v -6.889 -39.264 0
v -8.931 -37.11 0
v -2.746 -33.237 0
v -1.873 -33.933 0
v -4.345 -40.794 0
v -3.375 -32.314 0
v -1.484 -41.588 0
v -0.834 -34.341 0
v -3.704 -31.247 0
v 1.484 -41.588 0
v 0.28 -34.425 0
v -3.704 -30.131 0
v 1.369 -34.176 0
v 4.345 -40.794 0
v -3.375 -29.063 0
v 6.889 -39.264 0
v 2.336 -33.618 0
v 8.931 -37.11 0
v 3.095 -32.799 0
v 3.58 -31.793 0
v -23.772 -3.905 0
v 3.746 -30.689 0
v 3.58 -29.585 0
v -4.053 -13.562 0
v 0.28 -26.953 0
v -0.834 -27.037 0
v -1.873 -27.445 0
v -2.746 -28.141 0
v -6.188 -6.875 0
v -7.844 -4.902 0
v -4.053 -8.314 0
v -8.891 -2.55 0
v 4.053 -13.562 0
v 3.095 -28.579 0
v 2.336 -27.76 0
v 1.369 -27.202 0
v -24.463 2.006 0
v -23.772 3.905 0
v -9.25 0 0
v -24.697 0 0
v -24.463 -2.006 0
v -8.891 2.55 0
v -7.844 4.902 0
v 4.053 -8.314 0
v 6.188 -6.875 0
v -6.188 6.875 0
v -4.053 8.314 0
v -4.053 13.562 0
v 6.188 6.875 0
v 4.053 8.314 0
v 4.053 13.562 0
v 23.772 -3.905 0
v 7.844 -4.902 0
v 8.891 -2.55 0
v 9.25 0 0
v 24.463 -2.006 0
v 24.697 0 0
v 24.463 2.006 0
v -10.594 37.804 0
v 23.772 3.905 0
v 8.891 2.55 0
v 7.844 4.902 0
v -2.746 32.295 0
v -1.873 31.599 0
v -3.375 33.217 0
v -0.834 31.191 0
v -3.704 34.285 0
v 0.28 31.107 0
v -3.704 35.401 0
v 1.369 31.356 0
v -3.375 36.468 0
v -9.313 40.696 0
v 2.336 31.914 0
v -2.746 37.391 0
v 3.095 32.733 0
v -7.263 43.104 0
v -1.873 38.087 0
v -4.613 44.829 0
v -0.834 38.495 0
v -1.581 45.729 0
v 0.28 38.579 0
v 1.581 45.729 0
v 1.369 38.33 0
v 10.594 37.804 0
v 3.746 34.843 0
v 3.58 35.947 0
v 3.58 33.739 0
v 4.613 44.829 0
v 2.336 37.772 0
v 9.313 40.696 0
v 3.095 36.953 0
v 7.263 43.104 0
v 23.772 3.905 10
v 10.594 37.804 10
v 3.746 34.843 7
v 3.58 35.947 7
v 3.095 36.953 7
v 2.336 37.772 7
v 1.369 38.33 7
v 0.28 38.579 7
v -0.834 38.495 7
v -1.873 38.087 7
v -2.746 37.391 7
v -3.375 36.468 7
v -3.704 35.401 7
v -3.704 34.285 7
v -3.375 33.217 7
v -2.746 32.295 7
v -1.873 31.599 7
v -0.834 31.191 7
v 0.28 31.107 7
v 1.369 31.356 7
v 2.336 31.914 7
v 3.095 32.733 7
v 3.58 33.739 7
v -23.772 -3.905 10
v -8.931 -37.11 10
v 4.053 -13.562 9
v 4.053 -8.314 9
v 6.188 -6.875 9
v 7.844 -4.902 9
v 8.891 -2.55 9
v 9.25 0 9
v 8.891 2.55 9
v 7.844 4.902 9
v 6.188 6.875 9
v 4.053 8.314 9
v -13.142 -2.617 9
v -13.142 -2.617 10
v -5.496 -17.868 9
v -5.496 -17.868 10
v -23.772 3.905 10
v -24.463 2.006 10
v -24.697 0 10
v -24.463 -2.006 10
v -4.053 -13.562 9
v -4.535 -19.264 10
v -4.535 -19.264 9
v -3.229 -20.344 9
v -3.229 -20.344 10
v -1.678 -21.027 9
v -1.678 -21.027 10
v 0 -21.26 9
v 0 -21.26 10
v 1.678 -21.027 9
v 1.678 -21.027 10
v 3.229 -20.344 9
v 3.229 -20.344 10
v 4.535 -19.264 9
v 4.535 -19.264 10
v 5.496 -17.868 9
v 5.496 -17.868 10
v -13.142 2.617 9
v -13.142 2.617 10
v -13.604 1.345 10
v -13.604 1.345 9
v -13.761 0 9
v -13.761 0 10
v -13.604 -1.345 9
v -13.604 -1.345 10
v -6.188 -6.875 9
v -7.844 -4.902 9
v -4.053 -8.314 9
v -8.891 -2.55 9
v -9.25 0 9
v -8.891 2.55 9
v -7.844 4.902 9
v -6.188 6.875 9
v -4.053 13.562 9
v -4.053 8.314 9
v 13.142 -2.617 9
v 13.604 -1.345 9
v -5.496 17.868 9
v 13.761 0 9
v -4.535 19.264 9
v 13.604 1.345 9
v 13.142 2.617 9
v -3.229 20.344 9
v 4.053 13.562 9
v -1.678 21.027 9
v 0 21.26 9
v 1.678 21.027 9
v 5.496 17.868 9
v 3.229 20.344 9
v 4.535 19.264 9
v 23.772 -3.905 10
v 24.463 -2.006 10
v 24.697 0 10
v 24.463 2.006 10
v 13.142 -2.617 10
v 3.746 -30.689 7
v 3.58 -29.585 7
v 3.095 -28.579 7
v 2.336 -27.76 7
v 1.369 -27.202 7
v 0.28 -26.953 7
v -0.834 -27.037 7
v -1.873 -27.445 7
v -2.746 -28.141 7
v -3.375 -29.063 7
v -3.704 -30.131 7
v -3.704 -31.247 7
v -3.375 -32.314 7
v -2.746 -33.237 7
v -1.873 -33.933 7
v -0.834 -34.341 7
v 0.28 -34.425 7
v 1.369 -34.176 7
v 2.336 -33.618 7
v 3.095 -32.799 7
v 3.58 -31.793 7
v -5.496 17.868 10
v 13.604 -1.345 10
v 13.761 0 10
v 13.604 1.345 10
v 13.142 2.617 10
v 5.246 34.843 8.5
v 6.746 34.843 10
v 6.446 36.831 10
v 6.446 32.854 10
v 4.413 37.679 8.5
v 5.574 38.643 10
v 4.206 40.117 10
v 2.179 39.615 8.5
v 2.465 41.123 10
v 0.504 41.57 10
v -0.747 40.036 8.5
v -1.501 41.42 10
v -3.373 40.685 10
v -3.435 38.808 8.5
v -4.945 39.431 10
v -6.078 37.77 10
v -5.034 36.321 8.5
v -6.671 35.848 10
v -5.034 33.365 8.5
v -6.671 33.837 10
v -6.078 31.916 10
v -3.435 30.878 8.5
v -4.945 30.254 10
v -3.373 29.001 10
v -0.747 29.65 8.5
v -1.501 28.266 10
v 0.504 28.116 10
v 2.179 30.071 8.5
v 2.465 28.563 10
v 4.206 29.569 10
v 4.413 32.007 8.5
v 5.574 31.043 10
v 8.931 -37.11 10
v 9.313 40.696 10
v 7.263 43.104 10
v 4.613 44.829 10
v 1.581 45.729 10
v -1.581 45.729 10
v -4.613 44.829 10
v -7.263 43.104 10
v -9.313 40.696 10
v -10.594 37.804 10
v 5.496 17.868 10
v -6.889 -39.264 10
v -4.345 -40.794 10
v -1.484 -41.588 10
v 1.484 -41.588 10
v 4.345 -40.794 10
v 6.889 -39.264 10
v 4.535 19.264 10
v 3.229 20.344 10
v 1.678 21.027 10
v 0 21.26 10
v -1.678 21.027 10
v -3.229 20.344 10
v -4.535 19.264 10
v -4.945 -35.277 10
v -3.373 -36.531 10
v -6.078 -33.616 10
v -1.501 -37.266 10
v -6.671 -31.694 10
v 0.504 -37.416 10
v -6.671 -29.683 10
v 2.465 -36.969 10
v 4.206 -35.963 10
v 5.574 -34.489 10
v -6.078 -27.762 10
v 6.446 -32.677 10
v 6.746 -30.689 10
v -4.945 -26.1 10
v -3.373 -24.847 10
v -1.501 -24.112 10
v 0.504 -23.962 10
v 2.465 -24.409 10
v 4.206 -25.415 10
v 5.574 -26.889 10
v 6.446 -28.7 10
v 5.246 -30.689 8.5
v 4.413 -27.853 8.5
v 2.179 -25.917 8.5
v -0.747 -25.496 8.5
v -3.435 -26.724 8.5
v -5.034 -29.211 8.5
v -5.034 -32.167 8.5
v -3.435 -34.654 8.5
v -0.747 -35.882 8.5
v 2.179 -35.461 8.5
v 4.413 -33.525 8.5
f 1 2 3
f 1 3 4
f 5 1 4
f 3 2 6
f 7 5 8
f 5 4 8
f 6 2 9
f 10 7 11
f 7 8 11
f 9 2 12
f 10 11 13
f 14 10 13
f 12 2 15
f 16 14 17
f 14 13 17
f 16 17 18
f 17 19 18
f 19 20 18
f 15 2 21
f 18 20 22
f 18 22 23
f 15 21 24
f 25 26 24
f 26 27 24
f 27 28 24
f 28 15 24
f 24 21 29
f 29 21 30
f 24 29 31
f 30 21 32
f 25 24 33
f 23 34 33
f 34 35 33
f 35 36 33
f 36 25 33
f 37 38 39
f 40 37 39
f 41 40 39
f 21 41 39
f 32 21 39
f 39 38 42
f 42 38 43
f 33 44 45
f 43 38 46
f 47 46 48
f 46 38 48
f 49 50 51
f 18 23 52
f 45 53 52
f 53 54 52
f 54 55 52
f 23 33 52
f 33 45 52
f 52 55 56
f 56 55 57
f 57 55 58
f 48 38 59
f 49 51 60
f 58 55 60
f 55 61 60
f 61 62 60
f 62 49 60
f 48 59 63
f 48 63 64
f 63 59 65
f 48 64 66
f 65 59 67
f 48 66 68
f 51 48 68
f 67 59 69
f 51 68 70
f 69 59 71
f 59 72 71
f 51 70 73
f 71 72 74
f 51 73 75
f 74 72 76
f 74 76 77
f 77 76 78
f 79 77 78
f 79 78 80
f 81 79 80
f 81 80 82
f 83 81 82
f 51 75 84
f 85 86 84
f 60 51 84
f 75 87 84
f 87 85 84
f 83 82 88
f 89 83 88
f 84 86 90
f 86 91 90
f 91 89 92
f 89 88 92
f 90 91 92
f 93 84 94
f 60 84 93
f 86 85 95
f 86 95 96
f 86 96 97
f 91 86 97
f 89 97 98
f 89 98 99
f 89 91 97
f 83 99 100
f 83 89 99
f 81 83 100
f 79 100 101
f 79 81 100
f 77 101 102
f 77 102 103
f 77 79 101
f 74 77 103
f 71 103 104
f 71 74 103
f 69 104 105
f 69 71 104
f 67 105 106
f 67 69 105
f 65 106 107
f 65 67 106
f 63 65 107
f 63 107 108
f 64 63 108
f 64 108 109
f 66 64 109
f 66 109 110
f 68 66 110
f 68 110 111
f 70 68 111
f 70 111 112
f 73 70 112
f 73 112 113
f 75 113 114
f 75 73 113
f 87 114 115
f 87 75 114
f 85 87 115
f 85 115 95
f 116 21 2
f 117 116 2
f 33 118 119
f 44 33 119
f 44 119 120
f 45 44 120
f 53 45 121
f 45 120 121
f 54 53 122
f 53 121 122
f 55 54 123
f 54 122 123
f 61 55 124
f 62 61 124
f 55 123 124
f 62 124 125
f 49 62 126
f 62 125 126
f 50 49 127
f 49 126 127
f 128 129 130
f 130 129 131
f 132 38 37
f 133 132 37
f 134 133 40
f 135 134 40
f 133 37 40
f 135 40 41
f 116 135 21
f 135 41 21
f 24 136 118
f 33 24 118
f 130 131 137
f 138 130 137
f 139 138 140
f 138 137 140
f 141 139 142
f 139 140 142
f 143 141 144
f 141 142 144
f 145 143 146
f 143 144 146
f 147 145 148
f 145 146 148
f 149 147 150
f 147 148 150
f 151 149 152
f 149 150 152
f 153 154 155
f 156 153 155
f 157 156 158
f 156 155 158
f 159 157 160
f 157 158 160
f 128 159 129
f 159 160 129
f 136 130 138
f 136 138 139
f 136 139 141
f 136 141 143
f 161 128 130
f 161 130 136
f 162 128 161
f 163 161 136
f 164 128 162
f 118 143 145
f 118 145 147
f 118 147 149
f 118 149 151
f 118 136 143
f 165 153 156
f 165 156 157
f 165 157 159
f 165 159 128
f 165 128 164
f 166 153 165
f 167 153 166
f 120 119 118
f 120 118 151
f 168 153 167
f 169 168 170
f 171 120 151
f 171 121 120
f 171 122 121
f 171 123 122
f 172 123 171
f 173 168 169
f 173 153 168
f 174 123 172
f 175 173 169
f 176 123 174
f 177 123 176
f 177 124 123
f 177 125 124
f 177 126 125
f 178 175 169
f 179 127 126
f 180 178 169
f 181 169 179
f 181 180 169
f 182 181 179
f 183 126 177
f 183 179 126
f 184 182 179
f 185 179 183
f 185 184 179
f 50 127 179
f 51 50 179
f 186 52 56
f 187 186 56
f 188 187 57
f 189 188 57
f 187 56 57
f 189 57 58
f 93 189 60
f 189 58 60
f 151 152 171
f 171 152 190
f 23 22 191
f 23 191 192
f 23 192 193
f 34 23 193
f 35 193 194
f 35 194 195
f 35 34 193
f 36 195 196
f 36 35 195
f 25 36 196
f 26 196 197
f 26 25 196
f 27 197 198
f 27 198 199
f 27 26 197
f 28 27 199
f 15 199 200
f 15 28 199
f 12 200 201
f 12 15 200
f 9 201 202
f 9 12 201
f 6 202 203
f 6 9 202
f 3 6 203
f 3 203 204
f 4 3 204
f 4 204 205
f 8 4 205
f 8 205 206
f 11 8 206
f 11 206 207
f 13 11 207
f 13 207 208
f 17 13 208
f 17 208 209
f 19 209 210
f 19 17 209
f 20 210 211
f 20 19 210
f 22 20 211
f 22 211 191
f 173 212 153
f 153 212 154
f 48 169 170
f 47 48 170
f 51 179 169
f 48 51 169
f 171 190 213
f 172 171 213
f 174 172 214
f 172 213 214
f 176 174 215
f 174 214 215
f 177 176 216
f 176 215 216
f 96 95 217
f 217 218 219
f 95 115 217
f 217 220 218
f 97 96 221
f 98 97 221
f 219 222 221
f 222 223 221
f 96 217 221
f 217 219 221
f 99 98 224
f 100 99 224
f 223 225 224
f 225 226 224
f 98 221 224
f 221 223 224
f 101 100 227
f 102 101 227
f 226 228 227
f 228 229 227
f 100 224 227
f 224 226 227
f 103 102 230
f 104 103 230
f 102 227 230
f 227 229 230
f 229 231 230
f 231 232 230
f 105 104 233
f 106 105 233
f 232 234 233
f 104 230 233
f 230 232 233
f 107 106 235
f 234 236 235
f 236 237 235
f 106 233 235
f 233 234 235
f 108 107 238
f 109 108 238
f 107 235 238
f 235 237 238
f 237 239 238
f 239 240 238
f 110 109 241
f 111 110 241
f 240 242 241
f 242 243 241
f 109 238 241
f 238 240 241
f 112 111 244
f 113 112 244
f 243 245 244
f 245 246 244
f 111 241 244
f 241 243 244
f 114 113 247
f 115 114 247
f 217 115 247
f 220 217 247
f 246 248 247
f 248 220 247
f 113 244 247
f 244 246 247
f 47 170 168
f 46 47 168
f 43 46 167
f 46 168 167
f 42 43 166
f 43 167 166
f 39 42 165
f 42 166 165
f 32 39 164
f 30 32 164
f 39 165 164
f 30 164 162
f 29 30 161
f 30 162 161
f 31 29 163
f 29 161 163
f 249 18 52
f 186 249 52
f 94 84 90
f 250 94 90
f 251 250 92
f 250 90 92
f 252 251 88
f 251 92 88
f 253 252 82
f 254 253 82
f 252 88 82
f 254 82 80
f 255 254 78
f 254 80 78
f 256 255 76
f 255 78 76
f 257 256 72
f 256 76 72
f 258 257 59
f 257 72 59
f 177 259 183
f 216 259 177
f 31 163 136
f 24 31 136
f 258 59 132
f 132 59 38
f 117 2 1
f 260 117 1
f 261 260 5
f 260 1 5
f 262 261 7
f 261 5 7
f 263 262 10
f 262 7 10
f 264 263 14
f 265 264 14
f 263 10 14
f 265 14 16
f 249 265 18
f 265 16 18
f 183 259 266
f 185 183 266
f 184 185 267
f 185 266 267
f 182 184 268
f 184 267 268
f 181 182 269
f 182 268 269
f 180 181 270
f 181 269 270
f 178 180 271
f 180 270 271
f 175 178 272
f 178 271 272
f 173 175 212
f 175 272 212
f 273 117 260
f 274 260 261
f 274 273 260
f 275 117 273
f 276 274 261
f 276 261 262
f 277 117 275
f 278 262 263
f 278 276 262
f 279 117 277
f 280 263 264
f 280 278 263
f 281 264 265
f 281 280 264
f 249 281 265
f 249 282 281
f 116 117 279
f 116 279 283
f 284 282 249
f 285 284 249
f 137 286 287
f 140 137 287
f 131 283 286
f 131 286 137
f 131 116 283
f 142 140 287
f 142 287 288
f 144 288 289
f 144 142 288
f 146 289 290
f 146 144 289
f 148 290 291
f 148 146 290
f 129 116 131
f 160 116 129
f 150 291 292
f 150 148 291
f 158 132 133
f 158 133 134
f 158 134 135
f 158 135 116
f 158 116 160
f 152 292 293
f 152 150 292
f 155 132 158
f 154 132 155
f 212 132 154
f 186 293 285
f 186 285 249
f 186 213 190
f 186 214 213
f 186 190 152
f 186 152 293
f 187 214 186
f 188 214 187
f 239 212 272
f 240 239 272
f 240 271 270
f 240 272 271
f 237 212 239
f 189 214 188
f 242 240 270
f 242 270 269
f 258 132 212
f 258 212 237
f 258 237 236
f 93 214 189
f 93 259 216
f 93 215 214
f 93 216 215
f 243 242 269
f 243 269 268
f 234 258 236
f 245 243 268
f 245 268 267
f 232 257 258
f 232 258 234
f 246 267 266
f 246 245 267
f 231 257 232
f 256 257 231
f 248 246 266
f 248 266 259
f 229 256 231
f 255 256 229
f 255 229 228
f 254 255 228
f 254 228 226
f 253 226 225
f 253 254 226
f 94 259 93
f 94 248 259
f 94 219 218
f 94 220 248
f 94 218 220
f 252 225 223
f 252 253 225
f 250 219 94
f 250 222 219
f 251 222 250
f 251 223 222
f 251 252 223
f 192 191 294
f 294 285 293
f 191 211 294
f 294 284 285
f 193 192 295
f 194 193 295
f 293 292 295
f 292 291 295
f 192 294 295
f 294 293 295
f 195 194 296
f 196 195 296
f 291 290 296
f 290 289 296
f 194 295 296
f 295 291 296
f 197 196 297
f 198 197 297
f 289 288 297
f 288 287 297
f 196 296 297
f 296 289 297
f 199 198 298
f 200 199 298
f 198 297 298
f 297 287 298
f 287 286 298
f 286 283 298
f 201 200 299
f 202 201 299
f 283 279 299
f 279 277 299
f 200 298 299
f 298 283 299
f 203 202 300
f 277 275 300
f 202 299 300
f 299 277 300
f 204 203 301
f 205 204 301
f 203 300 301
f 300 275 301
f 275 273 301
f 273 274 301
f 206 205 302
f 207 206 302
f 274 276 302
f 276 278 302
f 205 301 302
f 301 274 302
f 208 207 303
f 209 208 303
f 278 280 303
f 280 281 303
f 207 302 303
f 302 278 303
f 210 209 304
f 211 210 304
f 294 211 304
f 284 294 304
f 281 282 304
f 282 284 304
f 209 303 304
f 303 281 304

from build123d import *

# Parameters (mm, degrees)
SKETCH_R        = 3.746138
PAD_DEPTH       = 10
CHAMFER_SIZE    = 3
POCKET_DEPTH    = 1
POCKET001_DEPTH = 9.001


with BuildPart() as part:
    # Sketch → Pad (new body)
    with BuildSketch(Plane.XY):
        with BuildLine():
            ThreePointArc((-23.772092, 3.904727), (-24.696894, 0), (-23.772092, -3.904727))
            Line((-23.772092, -3.904727), (-8.931203, -37.109992))
            ThreePointArc((-8.931203, -37.109992), (0, -41.688736), (8.931203, -37.109992))
            Line((8.931203, -37.109992), (23.772092, -3.904727))
            ThreePointArc((23.772092, -3.904727), (24.696894, 0), (23.772092, 3.904727))
            Line((10.593771, 37.804188), (23.772092, 3.904727))
            ThreePointArc((10.593771, 37.804188), (0, 45.842754), (-10.593771, 37.804188))
            Line((-10.593771, 37.804188), (-23.772092, 3.904727))
        make_face()
        with Locations((0, 34.842873)):
            Circle(SKETCH_R, mode=Mode.SUBTRACT)
        with Locations((0, -30.688856)):
            Circle(SKETCH_R, mode=Mode.SUBTRACT)
    extrude(amount=PAD_DEPTH)

    # Chamfer
    chamfer_edges = [part.edges().sort_by_distance(p)[0] for p in [
        (-3.746138, 34.842873, 10),
        (-3.746138, -30.688856, 10),
    ]]
    chamfer(chamfer_edges, length=CHAMFER_SIZE)

    # Sketch001 (on Face4 of Chamfer) → Pocket (cut)
    with BuildSketch(Plane.XY.offset(10)):
        with BuildLine():
            ThreePointArc((5.49555, 17.868014), (0, 21.260344), (-5.49555, 17.868014))
            Line((-5.49555, 17.868014), (-13.141501, 2.617381))
            ThreePointArc((-13.141501, 2.617381), (-13.760876, 0), (-13.141501, -2.617381))
            Line((-13.141501, -2.617381), (-5.49555, -17.868014))
            ThreePointArc((-5.49555, -17.868014), (0, -21.260344), (5.49555, -17.868014))
            Line((5.49555, -17.868014), (13.141501, -2.617381))
            ThreePointArc((13.141501, -2.617381), (13.760876, 0), (13.141501, 2.617381))
            Line((5.49555, 17.868014), (13.141501, 2.617381))
        make_face()
    extrude(amount=-POCKET_DEPTH, mode=Mode.SUBTRACT)

    # Sketch002 (on Face23 of Pocket) → Pocket001 (cut, through all)
    with BuildSketch(Plane.XY.offset(9)):
        with BuildLine():
            ThreePointArc((-4.053463, 8.314375), (-9.249832, 0), (-4.053463, -8.314375))
            Line((-4.053463, -8.314375), (-4.053463, -13.561737))
            Line((-4.053463, -13.561737), (4.053463, -13.561737))
            Line((4.053463, -13.561737), (4.053463, -8.314375))
            ThreePointArc((4.053463, -8.314375), (9.249832, 0), (4.053463, 8.314375))
            Line((4.053463, 8.314375), (4.053463, 13.561737))
            Line((4.053463, 13.561737), (-4.053463, 13.561737))
            Line((-4.053463, 13.561737), (-4.053463, 8.314375))
        make_face()
    extrude(amount=-POCKET001_DEPTH, mode=Mode.SUBTRACT)


solid = part.part
